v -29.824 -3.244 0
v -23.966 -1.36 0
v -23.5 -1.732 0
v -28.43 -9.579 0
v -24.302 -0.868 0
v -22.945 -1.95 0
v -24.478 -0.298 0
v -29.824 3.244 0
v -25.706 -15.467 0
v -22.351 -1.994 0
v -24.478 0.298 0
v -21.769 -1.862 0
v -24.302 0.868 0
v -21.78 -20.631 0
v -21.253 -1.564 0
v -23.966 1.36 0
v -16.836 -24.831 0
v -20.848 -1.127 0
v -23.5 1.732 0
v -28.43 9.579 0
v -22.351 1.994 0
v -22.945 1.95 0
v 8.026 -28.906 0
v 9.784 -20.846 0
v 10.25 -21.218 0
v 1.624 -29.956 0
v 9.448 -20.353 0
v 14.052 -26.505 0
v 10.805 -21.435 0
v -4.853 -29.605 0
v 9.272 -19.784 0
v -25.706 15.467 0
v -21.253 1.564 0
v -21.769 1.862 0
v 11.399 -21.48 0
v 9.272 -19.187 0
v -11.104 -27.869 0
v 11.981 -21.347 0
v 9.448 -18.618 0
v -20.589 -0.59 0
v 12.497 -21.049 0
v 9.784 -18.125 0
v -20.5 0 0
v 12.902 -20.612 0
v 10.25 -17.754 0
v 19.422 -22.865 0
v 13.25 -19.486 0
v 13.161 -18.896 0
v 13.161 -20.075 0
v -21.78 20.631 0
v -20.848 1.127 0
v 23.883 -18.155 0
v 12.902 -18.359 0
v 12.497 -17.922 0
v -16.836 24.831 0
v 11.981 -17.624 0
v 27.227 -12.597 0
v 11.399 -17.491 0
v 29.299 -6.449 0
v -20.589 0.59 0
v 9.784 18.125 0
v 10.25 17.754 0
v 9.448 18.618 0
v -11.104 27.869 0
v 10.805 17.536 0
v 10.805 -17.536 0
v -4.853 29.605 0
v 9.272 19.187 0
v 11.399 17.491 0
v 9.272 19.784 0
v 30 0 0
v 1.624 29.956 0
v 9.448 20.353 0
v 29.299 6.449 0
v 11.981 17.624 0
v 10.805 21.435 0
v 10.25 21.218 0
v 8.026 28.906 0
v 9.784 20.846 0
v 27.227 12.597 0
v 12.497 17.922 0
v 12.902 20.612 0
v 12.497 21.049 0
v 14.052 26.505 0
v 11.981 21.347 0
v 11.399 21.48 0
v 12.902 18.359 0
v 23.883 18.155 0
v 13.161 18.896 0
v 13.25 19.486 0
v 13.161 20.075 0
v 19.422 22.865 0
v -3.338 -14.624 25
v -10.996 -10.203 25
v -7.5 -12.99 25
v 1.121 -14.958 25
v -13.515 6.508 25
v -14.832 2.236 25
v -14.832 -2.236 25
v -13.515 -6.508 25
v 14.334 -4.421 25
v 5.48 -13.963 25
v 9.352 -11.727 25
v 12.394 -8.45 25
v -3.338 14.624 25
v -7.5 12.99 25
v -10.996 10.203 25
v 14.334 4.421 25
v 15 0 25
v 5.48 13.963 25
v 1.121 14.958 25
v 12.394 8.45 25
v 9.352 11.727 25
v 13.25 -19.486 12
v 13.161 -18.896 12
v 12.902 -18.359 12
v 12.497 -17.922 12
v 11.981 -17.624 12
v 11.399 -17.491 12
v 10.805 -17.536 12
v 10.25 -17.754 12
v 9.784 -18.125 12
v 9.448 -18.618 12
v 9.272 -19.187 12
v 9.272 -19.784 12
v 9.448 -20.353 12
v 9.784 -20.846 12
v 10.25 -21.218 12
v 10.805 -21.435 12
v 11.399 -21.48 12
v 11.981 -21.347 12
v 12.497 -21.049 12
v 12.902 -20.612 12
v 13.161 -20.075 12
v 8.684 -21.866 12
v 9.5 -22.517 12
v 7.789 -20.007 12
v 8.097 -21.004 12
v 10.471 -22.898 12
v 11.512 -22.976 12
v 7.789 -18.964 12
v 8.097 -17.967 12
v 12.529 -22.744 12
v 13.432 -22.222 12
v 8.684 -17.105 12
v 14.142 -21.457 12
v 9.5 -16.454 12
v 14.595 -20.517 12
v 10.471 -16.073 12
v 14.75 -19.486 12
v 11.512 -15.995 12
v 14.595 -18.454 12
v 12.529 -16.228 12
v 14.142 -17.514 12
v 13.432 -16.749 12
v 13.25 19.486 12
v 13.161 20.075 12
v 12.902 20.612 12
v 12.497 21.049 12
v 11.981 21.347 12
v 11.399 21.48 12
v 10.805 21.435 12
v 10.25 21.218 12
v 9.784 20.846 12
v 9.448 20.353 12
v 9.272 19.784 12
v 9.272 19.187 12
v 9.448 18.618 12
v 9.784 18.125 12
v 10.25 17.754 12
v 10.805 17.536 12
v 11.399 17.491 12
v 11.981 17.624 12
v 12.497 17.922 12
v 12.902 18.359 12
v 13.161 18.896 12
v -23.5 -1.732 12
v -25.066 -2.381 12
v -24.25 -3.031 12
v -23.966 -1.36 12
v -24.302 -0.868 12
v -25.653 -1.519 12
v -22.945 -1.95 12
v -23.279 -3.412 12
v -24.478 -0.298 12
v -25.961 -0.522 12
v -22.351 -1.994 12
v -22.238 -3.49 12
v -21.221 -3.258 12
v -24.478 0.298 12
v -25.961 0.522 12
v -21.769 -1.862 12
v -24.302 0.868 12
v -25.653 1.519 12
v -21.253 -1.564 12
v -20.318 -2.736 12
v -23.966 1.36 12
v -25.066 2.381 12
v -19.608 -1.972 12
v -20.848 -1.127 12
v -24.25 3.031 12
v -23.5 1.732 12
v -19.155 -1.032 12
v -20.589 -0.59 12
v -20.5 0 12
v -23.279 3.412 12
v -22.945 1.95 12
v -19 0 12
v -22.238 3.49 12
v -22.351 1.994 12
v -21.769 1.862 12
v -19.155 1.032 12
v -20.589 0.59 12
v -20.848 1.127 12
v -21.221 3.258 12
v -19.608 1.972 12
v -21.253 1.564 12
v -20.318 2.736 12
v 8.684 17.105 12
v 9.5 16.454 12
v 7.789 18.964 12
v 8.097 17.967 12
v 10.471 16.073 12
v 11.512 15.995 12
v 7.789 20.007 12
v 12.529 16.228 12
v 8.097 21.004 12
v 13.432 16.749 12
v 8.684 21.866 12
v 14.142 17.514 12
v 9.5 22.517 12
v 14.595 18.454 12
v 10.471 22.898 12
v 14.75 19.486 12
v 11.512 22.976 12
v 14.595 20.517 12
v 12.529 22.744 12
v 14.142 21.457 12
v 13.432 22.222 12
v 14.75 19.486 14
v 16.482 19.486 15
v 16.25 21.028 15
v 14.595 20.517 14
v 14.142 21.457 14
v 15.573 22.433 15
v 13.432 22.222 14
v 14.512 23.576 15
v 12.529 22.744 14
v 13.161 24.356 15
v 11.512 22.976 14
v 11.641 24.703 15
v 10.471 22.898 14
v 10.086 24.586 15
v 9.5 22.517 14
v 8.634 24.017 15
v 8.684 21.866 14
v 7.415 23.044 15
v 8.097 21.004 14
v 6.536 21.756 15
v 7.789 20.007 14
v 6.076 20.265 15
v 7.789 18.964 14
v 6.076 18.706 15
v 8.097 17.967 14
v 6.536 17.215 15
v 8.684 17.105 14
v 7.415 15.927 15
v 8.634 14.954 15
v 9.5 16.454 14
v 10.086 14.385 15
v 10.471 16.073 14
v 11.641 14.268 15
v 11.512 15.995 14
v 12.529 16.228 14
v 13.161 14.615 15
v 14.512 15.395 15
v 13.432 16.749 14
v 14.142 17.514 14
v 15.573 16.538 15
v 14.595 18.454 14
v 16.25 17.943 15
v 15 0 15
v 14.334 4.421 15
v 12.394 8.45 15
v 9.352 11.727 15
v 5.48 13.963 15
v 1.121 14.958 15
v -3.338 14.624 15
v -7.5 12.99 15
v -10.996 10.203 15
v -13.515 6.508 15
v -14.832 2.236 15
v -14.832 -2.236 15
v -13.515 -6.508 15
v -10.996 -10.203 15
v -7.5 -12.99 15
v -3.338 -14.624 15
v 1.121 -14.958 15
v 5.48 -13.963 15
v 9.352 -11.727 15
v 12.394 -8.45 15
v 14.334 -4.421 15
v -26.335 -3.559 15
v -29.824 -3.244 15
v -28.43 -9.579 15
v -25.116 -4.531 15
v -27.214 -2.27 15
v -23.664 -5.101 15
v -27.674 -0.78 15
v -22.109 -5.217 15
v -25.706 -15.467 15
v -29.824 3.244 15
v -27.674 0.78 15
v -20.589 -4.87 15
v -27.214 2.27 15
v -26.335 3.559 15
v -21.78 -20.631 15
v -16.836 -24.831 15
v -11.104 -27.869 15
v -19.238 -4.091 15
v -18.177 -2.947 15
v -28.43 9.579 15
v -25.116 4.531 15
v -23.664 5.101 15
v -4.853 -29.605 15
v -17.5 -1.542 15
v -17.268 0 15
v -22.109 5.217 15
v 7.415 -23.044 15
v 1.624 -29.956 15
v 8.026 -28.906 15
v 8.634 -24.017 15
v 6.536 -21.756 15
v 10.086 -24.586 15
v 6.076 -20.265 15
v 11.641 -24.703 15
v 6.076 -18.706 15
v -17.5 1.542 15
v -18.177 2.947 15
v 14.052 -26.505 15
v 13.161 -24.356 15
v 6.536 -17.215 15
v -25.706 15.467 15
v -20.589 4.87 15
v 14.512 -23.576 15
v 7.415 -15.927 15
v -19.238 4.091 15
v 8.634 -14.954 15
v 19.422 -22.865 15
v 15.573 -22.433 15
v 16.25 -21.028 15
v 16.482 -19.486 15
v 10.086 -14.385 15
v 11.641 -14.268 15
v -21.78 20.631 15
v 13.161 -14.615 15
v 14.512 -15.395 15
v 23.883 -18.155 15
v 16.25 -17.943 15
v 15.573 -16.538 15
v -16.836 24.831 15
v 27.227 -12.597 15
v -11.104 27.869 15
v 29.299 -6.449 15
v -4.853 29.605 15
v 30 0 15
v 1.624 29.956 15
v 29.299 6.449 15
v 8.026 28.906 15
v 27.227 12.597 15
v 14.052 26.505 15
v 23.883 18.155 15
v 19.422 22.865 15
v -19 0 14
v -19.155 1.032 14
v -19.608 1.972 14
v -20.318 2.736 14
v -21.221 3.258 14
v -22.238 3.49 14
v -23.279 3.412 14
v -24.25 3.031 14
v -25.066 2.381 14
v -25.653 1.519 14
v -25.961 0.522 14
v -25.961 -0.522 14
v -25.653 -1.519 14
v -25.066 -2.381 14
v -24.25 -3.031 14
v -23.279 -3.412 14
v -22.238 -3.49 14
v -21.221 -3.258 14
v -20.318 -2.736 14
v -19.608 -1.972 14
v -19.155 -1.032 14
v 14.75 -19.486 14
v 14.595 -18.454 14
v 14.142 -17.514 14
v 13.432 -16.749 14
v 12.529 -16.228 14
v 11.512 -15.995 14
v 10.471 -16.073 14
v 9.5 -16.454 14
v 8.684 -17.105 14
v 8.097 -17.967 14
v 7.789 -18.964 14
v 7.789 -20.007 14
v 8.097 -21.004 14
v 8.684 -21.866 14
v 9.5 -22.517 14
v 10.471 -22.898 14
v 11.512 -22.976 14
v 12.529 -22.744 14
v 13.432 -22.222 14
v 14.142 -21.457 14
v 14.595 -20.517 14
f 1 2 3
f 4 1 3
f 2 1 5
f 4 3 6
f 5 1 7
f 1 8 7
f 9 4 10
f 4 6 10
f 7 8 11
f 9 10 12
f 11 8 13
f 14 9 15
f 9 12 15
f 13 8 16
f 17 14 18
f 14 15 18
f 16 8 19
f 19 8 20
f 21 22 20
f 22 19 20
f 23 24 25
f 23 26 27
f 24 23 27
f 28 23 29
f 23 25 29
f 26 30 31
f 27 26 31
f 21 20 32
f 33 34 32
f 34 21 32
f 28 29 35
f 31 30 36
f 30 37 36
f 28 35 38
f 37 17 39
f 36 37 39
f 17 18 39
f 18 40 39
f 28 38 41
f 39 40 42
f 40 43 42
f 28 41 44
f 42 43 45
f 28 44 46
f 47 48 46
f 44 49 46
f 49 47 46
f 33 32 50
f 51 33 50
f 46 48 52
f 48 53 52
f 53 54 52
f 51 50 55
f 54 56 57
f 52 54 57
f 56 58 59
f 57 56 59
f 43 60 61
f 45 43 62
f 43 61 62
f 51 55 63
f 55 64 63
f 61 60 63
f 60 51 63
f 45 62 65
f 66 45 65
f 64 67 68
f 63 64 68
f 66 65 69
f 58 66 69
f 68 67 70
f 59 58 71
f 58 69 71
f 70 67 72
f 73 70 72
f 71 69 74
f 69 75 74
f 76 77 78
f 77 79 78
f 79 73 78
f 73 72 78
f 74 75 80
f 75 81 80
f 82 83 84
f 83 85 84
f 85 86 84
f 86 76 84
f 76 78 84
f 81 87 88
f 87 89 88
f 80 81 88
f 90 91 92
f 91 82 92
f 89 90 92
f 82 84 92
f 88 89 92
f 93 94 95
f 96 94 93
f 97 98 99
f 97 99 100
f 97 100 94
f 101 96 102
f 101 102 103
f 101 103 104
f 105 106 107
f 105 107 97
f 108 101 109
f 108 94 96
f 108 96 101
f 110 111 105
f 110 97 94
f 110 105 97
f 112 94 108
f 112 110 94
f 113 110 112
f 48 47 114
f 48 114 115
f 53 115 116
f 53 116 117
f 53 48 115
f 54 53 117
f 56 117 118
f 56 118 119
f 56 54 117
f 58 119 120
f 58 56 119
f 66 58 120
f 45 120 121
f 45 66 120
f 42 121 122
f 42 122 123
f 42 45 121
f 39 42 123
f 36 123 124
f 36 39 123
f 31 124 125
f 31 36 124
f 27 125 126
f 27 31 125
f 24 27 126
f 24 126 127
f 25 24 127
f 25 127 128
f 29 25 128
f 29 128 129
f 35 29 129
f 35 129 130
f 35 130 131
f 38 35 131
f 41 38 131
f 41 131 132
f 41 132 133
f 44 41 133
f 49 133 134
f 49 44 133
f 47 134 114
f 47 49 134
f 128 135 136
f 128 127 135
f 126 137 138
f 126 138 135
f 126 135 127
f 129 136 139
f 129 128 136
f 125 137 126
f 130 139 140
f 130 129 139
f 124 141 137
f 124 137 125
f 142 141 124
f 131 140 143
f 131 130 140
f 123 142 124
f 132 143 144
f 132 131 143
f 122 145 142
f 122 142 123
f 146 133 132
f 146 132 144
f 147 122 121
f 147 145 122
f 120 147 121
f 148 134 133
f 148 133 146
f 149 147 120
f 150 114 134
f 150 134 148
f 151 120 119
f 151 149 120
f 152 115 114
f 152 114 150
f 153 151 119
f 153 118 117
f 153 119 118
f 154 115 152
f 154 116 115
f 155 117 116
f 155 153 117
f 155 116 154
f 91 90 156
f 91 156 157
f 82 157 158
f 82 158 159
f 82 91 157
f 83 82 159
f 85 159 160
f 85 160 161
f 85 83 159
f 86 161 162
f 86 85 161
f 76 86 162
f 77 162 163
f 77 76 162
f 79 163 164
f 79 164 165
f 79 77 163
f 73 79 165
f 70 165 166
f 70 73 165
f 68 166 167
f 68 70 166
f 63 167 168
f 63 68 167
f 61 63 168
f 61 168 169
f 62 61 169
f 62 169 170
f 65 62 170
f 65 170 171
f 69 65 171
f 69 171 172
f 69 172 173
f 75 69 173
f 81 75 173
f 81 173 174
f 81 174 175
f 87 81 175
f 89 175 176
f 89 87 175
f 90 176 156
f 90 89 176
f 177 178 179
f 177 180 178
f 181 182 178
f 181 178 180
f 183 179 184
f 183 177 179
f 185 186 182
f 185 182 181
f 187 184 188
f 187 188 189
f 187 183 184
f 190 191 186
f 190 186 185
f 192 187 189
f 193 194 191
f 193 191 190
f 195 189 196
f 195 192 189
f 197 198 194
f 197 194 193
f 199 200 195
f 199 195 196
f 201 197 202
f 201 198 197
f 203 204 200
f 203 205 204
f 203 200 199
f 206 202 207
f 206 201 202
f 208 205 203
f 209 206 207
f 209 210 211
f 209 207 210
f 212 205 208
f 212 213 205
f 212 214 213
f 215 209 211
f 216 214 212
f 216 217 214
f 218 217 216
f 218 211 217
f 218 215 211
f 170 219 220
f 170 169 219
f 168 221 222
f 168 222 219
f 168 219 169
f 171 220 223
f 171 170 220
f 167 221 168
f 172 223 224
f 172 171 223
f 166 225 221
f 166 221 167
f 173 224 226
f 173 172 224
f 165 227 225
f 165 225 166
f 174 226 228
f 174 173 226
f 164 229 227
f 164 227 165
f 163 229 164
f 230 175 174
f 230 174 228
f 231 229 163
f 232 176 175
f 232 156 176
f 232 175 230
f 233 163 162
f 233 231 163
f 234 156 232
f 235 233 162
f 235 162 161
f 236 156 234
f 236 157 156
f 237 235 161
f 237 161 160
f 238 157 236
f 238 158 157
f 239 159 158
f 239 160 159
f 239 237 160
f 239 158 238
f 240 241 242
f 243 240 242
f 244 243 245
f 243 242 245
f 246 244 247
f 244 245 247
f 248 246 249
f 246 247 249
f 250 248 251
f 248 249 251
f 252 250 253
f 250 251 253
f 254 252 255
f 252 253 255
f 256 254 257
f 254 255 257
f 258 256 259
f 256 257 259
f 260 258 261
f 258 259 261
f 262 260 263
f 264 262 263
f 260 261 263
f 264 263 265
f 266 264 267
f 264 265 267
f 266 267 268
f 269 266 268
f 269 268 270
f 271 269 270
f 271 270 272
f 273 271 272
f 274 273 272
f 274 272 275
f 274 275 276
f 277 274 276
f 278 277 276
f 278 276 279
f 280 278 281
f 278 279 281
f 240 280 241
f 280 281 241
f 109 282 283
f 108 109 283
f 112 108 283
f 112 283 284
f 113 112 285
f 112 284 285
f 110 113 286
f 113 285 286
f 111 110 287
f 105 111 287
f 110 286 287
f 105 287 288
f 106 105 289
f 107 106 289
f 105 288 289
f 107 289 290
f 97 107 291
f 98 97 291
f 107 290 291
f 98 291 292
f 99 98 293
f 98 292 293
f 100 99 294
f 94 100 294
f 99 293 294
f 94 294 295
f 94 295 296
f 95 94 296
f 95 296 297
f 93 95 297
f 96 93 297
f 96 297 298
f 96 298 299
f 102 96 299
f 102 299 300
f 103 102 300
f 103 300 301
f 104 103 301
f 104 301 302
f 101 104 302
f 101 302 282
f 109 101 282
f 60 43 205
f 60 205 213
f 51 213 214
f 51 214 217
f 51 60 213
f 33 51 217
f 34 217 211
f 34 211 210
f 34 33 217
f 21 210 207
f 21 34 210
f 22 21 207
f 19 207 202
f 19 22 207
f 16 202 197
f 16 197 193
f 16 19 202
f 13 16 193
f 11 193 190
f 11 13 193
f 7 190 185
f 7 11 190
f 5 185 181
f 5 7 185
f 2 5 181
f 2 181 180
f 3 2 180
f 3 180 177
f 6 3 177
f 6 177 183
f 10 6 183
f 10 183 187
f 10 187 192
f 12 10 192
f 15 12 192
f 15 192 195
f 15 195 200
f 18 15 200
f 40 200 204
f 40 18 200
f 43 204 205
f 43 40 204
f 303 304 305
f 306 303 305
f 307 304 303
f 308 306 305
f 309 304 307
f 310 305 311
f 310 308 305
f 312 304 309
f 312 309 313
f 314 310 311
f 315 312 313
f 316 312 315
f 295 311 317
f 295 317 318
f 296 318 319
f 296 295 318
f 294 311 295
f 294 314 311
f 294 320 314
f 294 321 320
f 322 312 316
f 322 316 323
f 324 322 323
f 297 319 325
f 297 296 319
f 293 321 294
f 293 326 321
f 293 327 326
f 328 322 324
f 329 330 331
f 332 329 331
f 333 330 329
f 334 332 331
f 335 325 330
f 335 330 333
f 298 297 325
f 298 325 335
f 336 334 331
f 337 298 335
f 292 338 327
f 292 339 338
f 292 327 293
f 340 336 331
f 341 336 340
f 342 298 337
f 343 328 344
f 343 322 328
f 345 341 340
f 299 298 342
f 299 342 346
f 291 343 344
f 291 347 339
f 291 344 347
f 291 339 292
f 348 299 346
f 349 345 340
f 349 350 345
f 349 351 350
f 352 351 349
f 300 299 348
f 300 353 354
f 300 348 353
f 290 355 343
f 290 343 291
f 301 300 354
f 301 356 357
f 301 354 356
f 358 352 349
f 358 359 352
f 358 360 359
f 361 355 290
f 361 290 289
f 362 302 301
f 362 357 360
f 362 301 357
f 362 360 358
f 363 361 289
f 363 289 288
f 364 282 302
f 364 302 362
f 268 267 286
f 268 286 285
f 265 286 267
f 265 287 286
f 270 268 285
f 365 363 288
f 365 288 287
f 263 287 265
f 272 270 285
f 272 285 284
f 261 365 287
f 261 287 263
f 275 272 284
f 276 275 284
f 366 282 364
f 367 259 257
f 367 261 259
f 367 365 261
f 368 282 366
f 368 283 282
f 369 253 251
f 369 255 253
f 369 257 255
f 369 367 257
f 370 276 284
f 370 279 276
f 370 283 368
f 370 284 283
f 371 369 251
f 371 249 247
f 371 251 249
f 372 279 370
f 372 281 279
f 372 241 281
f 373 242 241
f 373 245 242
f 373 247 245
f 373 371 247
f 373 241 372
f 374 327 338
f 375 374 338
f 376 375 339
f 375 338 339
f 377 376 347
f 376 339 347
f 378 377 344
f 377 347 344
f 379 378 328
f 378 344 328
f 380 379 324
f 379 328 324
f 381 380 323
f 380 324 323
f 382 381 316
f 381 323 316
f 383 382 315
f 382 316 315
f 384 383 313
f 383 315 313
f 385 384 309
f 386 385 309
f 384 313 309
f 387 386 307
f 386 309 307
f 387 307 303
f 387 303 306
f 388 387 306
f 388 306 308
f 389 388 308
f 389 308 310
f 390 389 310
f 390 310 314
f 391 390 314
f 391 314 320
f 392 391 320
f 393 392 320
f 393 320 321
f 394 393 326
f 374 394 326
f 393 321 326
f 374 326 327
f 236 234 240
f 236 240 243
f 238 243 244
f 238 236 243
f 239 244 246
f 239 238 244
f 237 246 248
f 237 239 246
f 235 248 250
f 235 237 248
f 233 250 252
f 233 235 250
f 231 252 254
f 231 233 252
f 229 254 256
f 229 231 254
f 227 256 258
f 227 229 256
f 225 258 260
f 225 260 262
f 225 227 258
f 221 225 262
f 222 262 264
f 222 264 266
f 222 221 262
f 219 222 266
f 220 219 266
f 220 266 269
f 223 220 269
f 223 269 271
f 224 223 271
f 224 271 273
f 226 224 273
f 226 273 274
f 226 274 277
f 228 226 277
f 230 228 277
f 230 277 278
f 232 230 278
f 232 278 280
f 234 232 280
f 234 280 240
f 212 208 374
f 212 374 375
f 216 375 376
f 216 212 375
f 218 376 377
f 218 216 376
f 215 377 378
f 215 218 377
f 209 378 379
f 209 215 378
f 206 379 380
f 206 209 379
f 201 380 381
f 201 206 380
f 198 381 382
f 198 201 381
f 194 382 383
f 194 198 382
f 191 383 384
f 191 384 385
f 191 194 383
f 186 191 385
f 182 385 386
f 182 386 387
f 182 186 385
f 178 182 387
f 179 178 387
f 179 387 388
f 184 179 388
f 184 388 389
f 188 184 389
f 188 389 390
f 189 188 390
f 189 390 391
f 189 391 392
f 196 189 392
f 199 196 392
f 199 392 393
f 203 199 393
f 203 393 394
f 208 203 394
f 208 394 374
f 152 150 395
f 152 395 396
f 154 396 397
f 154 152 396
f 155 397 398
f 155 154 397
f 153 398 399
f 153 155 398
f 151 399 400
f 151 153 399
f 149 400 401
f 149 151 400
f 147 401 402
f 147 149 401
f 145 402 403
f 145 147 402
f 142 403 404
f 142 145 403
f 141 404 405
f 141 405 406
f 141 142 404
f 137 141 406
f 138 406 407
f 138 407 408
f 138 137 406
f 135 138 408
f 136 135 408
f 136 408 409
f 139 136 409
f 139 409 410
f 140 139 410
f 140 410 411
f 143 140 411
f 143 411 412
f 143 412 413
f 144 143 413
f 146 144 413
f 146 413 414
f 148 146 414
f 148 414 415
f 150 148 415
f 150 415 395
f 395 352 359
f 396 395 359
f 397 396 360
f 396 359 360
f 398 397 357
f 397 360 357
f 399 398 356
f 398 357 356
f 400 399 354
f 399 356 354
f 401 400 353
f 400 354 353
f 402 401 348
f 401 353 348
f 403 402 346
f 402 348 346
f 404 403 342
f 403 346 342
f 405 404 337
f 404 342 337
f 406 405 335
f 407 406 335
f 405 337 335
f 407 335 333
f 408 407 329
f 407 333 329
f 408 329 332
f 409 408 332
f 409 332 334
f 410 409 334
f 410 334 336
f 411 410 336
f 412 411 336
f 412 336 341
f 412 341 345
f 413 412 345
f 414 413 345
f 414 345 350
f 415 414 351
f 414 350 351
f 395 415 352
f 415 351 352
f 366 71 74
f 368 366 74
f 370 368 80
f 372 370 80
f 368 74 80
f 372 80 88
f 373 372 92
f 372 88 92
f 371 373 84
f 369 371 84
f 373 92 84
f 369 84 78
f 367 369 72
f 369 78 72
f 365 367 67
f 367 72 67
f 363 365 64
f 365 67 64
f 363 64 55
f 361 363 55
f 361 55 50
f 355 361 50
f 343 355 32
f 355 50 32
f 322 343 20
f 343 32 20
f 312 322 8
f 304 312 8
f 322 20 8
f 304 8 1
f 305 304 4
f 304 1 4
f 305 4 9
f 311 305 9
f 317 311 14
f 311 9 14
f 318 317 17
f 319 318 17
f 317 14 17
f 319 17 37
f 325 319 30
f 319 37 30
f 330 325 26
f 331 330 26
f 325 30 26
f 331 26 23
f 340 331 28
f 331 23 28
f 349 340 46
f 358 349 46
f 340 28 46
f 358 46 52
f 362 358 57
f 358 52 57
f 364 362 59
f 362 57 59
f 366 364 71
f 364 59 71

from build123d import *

# Parameters (mm, degrees)
F0_R       = 30
F0_R_2     = 3.5
F0_R_3     = 15
F1_DEPTH   = 15
F2_DEPTH   = 25
F0_R_4     = 2
F3_DEPTH   = 12
F4_SIZE2   = 1.7320508076
F4_SIZE    = 1
F4_2_SIZE2 = 1.7320508076
F4_2_SIZE  = 1
F4_3_SIZE2 = 1.7320508076
F4_3_SIZE  = 1


with BuildPart() as f1:
    # F0 (on Top) → F1 (new body)
    with BuildSketch(Plane.XY):
        Circle(F0_R)
        with Locations((11.25, -19.4855715851)):
            Circle(F0_R_2, mode=Mode.SUBTRACT)
        with Locations((-22.5, 0)):
            Circle(F0_R_2, mode=Mode.SUBTRACT)
        Circle(F0_R_3, mode=Mode.SUBTRACT)
        with Locations((11.25, 19.4855715851)):
            Circle(F0_R_2, mode=Mode.SUBTRACT)
    extrude(amount=F1_DEPTH)

    # F0 (on Top) → F2 (join)
    with BuildSketch(Plane.XY):
        Circle(F0_R_3)
    extrude(amount=F2_DEPTH)

    # F0 (on Top) → F3 (join)
    with BuildSketch(Plane.XY):
        with Locations((11.25, 19.4855715851)):
            Circle(F0_R_2)
        with Locations((11.25, 19.4855715851)):
            Circle(F0_R_4, mode=Mode.SUBTRACT)
        with Locations((11.25, -19.4855715851)):
            Circle(F0_R_2)
        with Locations((11.25, -19.4855715851)):
            Circle(F0_R_4, mode=Mode.SUBTRACT)
        with Locations((-22.5, 0)):
            Circle(F0_R_2)
        with Locations((-22.5, 0)):
            Circle(F0_R_4, mode=Mode.SUBTRACT)
    extrude(amount=F3_DEPTH)

    # F4
    f4_edges = [f1.edges().sort_by_distance(p)[0] for p in [
        (-26, 0, 15),
    ]]
    f4_side = f1.faces().sort_by_distance((-26, 0, 13.5))[0]
    chamfer(f4_edges, length=F4_SIZE, length2=F4_SIZE2, reference=f4_side)

    # F4#2
    f4_2_edges = [f1.edges().sort_by_distance(p)[0] for p in [
        (7.75, -19.485572, 15),
    ]]
    f4_2_side = f1.faces().sort_by_distance((7.75, -19.485572, 13.5))[0]
    chamfer(f4_2_edges, length=F4_2_SIZE, length2=F4_2_SIZE2, reference=f4_2_side)

    # F4#3
    f4_3_edges = [f1.edges().sort_by_distance(p)[0] for p in [
        (7.75, 19.485572, 15),
    ]]
    f4_3_side = f1.faces().sort_by_distance((7.75, 19.485572, 13.5))[0]
    chamfer(f4_3_edges, length=F4_3_SIZE, length2=F4_3_SIZE2, reference=f4_3_side)


solid = f1.part
